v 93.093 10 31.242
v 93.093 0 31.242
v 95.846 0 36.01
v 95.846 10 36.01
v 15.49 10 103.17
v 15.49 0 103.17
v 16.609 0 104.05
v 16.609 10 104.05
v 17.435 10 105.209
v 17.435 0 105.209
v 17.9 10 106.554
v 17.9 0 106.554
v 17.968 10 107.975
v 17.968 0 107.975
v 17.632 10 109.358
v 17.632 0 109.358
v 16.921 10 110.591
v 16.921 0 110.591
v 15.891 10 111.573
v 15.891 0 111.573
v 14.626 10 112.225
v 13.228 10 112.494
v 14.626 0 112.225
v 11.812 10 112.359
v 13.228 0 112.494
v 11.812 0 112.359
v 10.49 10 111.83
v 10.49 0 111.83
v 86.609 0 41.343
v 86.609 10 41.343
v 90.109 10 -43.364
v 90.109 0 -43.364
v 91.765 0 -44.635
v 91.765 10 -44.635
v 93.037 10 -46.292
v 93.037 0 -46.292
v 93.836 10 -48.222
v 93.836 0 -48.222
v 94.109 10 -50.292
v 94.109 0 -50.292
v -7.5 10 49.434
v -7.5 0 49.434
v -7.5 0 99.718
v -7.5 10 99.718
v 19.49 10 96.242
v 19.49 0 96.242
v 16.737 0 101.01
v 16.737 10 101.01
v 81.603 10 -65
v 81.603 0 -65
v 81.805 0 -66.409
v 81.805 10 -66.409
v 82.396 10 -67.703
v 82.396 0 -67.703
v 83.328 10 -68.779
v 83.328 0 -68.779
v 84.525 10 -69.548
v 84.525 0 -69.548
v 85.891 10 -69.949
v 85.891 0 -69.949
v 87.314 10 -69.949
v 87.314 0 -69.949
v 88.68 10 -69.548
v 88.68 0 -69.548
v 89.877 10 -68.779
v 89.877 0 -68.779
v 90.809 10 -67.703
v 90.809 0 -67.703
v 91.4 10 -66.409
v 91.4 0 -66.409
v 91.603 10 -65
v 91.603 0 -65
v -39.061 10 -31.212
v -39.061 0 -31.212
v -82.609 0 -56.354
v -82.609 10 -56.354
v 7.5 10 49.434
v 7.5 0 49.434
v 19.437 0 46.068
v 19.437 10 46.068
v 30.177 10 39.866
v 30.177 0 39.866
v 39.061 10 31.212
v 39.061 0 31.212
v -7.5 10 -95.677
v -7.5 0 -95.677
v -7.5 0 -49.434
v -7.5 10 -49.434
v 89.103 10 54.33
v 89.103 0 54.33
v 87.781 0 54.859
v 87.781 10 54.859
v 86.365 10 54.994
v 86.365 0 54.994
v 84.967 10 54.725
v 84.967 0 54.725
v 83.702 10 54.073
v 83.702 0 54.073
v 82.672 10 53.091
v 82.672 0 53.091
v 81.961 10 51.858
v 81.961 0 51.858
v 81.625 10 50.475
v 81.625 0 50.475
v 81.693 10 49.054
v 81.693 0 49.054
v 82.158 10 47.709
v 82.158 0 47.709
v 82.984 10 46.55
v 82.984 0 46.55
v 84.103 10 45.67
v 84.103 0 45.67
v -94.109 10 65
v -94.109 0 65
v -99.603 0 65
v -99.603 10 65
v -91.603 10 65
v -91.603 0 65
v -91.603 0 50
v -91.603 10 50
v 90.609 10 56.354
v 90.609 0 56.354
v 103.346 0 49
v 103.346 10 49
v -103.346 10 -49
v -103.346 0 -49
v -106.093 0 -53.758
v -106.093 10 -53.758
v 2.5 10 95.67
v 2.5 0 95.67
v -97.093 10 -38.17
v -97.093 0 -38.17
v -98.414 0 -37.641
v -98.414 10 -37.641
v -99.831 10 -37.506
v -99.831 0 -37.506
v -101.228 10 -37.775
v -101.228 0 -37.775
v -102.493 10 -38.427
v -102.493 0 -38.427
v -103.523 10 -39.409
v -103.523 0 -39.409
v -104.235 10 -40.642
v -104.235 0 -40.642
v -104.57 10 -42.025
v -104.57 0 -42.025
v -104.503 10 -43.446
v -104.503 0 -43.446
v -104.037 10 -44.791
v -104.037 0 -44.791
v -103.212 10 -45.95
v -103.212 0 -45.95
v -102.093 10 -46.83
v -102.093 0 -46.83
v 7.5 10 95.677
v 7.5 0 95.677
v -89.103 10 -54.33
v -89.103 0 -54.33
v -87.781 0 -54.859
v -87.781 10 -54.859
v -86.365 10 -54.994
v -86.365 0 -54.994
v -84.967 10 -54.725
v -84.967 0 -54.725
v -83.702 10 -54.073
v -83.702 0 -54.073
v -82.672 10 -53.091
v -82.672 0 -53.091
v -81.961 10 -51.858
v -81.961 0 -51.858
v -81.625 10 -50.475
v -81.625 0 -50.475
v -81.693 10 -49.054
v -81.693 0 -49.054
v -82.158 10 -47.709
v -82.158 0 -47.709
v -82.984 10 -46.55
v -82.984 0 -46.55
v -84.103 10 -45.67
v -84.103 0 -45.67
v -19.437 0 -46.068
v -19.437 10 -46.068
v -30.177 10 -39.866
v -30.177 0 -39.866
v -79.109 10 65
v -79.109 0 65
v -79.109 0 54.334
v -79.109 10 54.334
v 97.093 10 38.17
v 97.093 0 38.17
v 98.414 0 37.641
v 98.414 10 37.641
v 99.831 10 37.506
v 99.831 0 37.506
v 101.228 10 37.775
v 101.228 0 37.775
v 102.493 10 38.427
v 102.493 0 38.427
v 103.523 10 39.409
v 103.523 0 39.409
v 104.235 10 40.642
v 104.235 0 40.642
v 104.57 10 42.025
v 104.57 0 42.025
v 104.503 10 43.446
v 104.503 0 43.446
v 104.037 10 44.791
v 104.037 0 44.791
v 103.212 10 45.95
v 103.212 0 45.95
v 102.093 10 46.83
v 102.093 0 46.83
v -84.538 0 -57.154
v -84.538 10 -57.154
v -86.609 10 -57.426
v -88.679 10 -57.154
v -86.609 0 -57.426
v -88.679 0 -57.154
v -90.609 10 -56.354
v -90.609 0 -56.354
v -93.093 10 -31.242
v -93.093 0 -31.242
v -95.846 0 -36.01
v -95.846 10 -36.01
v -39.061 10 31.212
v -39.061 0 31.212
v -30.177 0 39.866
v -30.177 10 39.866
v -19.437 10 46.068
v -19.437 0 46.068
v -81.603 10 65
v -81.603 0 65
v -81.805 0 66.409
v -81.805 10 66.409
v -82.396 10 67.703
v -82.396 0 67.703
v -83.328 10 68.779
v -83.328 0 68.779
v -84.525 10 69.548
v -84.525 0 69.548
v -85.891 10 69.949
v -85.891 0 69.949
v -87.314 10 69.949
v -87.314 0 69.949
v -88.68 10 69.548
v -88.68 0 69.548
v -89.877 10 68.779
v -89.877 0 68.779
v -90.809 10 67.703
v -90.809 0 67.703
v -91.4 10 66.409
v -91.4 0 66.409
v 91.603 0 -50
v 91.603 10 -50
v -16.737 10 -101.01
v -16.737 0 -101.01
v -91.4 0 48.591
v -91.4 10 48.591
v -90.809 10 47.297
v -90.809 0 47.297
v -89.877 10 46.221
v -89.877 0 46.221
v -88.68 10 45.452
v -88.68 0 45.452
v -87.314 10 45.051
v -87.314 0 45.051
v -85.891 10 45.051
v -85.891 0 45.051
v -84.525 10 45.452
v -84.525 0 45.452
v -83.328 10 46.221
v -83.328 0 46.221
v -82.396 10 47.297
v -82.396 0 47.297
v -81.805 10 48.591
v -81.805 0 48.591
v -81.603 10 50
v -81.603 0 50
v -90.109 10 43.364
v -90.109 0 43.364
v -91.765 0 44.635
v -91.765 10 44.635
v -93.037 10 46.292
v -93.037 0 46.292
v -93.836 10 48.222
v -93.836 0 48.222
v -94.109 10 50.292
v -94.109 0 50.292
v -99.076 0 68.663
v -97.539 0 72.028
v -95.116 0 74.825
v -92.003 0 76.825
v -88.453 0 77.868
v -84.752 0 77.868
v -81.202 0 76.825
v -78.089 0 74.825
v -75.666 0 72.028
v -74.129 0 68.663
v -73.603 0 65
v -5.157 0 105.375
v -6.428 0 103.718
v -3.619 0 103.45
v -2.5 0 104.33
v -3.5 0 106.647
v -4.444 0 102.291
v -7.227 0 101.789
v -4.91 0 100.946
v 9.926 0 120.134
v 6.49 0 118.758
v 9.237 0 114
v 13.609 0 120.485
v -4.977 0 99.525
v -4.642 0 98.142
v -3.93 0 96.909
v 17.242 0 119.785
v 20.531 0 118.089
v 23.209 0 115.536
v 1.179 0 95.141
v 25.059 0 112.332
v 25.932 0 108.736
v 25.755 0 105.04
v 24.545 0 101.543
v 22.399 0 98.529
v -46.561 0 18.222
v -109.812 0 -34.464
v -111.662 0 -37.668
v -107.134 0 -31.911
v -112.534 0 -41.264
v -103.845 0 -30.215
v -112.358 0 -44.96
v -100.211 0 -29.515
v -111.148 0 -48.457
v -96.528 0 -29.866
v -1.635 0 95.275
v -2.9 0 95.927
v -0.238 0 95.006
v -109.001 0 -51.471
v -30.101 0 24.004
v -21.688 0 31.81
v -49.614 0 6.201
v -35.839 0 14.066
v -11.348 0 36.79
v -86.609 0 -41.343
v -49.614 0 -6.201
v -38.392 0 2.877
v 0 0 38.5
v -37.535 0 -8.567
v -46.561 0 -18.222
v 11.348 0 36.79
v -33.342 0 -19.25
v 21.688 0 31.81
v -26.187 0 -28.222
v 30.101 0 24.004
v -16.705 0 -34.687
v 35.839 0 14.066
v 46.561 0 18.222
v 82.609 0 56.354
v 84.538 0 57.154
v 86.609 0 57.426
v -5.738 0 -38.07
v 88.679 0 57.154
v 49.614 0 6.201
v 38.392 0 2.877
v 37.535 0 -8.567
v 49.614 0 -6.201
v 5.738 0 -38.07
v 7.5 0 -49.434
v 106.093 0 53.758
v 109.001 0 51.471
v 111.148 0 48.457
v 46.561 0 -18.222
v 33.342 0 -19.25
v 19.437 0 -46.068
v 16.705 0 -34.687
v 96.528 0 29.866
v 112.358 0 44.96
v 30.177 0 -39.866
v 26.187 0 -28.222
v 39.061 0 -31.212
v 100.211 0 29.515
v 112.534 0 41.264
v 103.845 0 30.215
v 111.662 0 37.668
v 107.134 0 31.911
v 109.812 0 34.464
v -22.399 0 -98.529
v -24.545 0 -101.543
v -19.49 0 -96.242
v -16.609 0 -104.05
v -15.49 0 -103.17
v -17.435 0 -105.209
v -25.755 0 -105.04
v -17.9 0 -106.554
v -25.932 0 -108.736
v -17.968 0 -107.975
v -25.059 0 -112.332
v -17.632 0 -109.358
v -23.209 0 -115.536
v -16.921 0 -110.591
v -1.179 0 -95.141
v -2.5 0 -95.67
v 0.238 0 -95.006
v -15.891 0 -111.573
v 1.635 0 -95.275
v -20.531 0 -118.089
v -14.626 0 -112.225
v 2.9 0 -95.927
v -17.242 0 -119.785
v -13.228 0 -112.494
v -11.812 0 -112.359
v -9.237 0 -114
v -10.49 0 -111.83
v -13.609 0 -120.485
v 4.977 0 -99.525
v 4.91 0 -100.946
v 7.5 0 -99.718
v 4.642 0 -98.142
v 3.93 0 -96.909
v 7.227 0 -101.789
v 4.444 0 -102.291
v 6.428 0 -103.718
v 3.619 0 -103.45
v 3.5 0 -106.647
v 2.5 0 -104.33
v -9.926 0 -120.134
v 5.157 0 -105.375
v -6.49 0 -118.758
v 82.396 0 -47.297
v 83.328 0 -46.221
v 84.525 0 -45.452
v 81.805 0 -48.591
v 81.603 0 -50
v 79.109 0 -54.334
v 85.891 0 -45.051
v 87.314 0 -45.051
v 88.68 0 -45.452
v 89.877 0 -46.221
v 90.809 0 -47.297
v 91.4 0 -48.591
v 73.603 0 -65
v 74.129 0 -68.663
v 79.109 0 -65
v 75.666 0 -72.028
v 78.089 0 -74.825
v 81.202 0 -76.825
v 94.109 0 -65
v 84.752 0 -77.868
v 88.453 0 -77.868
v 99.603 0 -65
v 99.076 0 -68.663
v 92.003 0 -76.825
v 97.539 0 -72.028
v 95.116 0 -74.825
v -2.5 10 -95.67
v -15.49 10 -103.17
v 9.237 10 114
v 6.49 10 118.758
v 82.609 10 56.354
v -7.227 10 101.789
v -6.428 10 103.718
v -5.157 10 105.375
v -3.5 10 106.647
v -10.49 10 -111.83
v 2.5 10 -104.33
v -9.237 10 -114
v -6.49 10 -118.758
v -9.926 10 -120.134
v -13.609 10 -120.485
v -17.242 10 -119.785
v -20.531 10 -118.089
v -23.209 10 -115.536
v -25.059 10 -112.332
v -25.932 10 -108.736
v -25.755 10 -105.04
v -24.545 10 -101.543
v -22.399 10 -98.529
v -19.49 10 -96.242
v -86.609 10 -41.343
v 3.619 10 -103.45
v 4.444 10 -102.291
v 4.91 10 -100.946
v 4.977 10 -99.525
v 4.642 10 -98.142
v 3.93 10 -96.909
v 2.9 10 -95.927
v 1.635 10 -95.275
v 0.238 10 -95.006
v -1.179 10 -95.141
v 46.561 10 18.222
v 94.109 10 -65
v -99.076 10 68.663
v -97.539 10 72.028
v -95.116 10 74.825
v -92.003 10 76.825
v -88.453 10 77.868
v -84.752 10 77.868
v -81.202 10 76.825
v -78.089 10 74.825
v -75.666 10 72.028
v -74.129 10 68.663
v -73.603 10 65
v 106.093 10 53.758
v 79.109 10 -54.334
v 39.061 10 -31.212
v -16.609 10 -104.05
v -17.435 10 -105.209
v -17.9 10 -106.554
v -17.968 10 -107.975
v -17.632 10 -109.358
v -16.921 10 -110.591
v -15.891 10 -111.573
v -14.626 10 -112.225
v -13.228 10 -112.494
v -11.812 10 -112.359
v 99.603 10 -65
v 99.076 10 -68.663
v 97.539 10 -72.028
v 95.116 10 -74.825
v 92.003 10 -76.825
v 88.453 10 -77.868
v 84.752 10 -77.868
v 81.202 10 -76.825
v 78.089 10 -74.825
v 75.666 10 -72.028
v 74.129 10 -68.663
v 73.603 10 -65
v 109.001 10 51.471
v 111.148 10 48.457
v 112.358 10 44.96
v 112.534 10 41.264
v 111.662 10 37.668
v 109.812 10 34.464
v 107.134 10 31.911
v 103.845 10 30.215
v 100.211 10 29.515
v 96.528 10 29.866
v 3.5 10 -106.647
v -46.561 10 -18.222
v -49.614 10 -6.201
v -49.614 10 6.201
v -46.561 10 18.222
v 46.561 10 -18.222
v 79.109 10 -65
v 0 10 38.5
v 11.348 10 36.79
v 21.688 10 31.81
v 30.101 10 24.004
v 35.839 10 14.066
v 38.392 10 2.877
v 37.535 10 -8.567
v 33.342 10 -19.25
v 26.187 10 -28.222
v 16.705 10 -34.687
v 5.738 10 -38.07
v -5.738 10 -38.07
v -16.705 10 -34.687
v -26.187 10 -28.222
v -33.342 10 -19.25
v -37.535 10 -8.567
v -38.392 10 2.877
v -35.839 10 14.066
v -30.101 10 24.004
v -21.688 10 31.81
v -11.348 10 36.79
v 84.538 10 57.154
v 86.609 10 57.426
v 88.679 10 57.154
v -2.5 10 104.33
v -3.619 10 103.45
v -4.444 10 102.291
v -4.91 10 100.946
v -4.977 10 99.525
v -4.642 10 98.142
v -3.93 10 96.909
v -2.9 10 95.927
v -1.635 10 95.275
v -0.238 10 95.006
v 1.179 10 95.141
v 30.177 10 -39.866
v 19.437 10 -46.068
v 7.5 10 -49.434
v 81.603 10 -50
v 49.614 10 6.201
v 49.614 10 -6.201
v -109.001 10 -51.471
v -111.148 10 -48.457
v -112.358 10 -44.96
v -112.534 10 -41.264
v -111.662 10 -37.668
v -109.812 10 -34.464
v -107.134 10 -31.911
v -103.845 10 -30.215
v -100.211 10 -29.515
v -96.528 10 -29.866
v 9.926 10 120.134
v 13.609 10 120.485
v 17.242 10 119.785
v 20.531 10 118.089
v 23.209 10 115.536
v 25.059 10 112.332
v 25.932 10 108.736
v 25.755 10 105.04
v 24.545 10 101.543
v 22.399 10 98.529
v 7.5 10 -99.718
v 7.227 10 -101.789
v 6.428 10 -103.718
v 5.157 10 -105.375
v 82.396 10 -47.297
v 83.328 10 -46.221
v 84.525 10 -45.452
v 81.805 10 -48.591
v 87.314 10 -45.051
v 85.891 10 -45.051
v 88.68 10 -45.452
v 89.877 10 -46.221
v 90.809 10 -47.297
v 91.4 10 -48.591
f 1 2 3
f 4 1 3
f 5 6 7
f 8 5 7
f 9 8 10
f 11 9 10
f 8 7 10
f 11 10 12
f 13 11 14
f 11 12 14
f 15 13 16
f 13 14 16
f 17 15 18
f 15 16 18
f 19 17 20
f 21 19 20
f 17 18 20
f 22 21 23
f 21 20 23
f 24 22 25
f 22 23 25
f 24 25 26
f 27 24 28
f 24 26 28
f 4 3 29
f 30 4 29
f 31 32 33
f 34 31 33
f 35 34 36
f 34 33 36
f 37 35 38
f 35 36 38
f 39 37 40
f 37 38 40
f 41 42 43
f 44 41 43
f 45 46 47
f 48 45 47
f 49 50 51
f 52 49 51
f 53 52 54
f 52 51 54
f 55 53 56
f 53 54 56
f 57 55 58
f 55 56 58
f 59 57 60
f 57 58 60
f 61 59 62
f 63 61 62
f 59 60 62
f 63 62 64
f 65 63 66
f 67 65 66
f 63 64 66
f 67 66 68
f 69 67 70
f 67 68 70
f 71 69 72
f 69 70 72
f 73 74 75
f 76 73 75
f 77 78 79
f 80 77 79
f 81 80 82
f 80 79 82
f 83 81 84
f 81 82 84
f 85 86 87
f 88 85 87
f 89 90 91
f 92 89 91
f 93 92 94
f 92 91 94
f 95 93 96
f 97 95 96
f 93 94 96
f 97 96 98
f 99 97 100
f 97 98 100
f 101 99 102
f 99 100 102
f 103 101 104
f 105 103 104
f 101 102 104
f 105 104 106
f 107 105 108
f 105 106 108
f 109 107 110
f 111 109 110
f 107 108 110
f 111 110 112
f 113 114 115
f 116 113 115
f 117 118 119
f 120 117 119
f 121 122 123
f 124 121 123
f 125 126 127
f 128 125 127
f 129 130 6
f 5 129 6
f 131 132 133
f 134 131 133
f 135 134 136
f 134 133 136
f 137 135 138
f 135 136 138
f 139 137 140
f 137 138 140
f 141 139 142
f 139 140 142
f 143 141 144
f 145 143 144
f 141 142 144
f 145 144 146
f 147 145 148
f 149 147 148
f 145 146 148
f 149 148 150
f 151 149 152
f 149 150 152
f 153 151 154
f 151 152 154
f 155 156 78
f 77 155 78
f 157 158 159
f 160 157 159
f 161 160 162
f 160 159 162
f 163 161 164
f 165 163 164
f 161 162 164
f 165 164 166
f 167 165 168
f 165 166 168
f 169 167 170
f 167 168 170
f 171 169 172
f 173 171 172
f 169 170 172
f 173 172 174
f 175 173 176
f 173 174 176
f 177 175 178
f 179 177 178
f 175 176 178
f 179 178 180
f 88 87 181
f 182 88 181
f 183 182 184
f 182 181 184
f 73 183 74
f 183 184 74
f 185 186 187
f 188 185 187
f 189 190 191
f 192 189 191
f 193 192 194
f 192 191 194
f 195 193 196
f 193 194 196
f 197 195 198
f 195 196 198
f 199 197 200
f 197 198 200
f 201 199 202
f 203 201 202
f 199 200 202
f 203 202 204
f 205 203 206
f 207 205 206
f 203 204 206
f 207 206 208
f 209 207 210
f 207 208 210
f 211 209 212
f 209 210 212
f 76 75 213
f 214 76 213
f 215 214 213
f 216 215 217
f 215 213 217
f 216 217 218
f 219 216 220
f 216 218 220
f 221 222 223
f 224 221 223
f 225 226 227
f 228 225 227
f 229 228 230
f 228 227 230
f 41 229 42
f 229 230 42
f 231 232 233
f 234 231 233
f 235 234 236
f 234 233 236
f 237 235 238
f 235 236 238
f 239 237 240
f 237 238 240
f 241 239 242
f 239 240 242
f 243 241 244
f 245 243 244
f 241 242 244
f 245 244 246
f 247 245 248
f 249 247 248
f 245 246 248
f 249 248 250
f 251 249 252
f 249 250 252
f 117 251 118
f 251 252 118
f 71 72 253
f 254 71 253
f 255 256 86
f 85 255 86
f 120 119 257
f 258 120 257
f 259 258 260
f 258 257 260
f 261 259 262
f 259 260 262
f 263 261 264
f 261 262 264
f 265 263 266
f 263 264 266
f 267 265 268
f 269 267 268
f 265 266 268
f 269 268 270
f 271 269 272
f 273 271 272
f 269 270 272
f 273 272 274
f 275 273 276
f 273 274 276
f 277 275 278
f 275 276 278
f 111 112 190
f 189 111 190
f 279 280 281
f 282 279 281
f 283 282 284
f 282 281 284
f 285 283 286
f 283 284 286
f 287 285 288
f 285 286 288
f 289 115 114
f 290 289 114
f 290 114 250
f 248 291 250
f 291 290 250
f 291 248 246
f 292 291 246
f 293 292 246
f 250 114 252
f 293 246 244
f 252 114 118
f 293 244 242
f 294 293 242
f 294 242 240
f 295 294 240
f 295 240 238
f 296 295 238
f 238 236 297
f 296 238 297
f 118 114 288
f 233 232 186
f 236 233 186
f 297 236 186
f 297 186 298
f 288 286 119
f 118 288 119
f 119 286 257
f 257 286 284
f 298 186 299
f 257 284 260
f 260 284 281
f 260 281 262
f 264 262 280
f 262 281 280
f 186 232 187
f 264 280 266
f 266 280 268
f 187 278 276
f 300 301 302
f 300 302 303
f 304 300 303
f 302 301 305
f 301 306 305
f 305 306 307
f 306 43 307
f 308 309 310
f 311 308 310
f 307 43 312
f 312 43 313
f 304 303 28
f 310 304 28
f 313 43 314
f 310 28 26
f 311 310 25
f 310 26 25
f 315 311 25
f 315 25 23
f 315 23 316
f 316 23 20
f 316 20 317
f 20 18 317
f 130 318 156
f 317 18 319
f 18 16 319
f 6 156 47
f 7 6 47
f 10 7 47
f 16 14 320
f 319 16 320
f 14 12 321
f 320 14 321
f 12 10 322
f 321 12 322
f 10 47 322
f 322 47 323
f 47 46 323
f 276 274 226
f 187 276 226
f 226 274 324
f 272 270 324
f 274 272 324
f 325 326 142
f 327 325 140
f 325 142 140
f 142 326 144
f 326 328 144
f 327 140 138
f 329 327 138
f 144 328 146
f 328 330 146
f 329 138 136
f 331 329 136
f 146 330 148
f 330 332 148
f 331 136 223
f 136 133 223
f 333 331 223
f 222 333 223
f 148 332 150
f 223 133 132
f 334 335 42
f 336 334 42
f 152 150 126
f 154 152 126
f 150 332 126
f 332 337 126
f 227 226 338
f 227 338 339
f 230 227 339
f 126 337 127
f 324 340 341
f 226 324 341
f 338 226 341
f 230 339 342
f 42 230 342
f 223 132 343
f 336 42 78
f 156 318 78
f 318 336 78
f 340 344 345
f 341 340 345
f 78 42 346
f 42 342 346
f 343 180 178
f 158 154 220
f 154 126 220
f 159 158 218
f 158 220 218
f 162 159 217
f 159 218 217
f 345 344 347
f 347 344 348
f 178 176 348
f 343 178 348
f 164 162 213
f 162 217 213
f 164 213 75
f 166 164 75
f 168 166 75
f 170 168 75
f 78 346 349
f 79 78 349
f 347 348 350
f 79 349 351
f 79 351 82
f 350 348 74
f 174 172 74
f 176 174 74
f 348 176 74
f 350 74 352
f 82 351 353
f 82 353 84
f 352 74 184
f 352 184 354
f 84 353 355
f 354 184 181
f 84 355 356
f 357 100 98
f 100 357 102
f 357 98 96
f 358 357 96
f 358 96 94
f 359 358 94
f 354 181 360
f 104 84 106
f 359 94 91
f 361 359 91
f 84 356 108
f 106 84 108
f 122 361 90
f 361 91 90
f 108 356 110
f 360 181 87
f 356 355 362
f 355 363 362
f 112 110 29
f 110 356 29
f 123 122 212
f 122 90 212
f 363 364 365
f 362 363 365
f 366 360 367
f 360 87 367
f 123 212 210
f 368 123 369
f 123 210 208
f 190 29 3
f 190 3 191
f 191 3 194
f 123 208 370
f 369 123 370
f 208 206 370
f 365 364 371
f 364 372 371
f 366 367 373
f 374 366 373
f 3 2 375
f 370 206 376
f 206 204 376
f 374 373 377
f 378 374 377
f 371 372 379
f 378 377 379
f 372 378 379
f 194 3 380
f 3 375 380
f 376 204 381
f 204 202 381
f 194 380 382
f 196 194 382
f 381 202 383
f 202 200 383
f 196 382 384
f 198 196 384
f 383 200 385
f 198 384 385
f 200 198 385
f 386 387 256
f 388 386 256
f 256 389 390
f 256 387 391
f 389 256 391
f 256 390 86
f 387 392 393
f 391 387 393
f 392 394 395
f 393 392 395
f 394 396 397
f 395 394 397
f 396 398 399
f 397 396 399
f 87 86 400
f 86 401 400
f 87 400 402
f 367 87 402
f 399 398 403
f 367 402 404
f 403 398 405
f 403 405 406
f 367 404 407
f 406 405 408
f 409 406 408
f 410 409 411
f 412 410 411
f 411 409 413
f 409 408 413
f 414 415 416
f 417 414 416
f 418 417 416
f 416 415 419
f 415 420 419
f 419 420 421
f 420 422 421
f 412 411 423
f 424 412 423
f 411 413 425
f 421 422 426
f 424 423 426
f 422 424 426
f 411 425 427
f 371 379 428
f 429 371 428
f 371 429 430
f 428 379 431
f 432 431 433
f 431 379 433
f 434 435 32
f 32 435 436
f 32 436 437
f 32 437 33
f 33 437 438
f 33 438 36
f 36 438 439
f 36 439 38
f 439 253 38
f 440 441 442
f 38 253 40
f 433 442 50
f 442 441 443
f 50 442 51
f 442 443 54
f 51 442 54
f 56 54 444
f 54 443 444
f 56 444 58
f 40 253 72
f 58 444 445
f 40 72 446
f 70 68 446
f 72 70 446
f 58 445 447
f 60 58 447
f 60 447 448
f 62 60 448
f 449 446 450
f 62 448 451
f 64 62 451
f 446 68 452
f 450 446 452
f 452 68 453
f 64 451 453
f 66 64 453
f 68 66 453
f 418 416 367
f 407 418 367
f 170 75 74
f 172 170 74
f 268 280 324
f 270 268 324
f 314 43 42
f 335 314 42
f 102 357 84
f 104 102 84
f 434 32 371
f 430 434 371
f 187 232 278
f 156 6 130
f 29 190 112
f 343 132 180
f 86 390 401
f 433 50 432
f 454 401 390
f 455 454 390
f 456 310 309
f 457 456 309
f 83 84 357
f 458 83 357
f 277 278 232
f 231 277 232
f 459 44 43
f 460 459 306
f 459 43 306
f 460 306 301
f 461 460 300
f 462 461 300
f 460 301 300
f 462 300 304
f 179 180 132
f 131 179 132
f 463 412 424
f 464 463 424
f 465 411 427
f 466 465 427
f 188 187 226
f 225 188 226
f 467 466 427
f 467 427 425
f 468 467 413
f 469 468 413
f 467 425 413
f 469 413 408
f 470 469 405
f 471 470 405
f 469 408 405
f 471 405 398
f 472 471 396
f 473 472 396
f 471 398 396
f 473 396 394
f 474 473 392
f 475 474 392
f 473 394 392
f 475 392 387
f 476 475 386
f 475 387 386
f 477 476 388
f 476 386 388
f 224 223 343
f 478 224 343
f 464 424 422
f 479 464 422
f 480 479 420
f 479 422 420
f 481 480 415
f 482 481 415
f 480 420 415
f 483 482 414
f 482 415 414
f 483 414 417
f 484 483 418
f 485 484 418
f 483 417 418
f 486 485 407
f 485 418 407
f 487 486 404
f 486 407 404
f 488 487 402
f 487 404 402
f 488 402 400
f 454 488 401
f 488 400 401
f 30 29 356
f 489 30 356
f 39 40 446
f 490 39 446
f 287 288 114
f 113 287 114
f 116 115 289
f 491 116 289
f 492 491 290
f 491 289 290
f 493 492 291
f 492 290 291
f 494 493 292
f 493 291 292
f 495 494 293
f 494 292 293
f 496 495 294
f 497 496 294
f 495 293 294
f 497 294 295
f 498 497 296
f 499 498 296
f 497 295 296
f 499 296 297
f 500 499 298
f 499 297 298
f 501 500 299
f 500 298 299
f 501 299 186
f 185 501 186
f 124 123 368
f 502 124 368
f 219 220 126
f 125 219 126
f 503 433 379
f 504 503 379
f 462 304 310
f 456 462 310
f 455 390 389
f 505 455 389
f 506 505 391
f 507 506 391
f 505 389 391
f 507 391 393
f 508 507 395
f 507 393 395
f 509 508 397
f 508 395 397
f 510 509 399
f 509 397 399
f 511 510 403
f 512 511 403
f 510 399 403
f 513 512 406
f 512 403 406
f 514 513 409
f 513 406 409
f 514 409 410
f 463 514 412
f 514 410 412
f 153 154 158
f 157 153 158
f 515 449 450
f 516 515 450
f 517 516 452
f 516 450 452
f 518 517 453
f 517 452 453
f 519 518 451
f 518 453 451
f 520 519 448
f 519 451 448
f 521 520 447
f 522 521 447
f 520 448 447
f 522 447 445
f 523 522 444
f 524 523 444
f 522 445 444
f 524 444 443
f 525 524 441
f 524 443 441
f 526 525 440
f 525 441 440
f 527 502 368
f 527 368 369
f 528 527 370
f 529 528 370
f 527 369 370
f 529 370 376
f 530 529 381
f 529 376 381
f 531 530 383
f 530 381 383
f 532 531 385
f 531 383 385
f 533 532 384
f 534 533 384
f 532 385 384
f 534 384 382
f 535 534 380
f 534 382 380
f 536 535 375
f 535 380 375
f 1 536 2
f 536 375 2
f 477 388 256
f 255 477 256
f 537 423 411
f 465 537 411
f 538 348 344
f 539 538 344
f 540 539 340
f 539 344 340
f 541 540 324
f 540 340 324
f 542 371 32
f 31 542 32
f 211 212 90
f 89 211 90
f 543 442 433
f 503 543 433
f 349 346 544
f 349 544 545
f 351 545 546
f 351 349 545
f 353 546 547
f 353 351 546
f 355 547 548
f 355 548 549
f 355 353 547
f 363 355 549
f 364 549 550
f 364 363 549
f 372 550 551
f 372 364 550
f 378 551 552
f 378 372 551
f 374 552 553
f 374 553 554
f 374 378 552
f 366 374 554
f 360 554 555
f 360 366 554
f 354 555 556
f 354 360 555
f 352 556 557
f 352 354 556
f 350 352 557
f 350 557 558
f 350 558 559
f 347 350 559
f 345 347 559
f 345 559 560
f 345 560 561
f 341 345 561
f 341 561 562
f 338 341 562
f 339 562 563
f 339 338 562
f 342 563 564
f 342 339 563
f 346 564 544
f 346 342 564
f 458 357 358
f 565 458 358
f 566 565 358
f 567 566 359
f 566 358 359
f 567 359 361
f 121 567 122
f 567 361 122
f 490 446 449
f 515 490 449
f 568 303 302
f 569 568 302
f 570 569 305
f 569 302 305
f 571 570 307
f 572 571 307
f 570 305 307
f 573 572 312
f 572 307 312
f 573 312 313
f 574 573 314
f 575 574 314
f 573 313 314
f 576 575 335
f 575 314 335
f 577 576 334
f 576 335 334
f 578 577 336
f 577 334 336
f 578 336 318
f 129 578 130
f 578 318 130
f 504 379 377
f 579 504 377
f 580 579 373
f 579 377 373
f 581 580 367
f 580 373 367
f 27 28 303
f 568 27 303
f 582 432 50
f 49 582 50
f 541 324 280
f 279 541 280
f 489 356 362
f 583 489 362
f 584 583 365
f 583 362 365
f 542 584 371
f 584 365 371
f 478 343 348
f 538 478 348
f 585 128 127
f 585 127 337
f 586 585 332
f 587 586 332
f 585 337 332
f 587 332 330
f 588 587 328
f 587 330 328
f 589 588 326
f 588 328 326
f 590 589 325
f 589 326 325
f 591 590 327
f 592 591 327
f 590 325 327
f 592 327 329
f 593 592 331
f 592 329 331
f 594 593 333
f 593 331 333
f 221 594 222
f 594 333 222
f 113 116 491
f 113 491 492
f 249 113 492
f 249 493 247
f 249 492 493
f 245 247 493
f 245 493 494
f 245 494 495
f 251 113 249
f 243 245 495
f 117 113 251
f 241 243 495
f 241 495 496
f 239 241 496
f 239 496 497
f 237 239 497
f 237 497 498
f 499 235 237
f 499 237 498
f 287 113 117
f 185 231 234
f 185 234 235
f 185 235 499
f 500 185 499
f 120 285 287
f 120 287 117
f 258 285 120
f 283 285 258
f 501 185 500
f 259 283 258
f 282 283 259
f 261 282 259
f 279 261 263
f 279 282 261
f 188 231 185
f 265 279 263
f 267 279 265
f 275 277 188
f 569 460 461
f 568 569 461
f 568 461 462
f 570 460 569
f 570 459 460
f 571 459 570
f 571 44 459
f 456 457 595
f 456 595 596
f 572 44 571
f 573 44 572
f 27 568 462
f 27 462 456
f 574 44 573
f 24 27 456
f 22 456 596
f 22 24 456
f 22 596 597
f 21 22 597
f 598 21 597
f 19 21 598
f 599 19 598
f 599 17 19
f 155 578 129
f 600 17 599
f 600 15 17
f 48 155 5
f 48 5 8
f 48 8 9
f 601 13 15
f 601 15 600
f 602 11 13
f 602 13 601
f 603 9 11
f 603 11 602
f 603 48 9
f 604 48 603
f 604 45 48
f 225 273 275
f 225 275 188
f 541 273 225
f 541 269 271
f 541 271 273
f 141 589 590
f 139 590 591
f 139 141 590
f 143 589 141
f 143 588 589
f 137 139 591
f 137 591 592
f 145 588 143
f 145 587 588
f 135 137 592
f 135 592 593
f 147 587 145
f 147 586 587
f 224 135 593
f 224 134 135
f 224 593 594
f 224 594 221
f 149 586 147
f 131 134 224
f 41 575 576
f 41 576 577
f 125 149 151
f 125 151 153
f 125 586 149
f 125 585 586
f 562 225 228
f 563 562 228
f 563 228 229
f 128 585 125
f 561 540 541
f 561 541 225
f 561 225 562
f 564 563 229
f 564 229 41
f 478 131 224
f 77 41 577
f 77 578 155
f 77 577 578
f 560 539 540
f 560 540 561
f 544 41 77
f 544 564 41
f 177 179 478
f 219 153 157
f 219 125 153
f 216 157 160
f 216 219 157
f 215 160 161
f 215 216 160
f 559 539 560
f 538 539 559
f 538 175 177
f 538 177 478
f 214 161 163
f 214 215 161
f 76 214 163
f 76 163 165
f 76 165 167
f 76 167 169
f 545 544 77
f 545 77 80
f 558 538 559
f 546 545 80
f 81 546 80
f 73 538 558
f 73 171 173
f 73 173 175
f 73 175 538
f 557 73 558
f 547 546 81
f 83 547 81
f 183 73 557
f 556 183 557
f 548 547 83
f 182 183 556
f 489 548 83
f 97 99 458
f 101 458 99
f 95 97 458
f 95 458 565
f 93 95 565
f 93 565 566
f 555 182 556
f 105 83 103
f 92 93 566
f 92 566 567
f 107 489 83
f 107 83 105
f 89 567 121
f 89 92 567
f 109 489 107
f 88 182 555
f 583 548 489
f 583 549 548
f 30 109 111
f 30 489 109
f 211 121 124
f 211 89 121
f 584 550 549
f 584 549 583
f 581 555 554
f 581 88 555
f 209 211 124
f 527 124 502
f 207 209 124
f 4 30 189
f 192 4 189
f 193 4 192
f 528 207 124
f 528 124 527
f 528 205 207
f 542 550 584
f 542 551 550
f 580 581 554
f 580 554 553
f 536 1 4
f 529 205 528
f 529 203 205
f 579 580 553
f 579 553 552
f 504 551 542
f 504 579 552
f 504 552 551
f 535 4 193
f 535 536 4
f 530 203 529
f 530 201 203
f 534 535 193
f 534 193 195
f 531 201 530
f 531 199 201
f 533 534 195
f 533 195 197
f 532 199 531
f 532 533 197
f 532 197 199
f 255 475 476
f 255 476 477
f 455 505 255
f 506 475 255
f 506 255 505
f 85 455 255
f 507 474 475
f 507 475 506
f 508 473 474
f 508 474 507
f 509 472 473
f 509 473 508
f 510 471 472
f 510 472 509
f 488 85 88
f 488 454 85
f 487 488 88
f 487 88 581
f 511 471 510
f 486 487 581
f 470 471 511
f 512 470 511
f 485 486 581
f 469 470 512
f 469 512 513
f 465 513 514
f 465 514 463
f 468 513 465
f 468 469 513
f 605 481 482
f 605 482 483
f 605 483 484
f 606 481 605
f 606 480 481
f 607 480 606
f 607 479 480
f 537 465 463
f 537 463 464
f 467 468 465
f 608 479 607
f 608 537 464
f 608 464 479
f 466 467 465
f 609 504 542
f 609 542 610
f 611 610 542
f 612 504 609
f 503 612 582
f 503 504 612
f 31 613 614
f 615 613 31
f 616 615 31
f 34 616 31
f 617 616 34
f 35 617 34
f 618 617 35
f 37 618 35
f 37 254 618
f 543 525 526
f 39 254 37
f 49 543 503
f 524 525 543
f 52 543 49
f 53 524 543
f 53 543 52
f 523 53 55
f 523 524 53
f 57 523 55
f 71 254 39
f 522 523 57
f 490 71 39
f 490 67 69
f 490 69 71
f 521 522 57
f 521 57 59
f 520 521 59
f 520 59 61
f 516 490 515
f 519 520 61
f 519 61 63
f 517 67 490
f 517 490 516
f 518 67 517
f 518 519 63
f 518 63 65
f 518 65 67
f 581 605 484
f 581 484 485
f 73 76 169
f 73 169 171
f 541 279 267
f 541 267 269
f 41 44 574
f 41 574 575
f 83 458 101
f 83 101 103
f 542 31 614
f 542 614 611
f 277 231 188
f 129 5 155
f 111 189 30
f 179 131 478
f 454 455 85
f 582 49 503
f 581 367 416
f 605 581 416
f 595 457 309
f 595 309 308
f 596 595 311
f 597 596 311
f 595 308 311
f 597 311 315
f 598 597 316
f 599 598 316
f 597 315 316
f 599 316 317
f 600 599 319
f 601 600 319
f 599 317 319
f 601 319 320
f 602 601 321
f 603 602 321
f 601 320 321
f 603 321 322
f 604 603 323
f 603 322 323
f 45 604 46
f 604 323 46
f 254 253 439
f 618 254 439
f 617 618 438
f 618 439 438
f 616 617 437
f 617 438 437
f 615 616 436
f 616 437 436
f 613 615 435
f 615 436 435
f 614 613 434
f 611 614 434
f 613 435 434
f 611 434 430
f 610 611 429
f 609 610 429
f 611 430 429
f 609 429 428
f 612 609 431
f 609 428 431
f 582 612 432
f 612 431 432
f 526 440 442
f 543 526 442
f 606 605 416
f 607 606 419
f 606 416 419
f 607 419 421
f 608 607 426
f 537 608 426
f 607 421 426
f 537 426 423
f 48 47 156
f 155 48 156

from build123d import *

# Parameters (mm, degrees)
SKETCH1_R           = 38.5
BOSS_EXTRUDE1_DEPTH = 10


with BuildPart() as part:
    # Sketch1 → Boss-Extrude1 (new body)
    with BuildSketch(Plane(origin=(0, 0, 0), x_dir=(1, 0, 0), z_dir=(0, 1, 0))):
        with BuildLine():
            Line((7.5, 49.434299833), (7.5, 99.718353376))
            ThreePointArc((7.5, 99.718353376), (6.42820323, 103.718353376), (3.5, 106.646556606))
            Line((3.5, 106.646556606), (-9.237337622, 114.000461911))
            Line((-9.237337622, 114.000461911), (-6.490381057, 118.758330249))
            ThreePointArc((-6.490381057, 118.758330249), (-24.248711306, 114), (-19.490381057, 96.241669751))
            Line((-19.490381057, 96.241669751), (-16.737337622, 101.010080854))
            Line((-16.737337622, 101.010080854), (-7.5, 95.676901492))
            Line((-7.5, 95.676901492), (-7.5, 49.434299833))
            ThreePointArc((-7.5, 49.434299833), (-25, 43.301270189), (-39.061359474, 31.212340445))
            Line((-39.061359474, 31.212340445), (-82.608627247, 56.354367216))
            ThreePointArc((-82.608627247, 56.354367216), (-86.608627247, 57.426163986), (-90.608627247, 56.354367216))
            Line((-90.608627247, 56.354367216), (-103.34596487, 49.000461911))
            Line((-103.34596487, 49.000461911), (-106.092921435, 53.758330249))
            ThreePointArc((-106.092921435, 53.758330249), (-110.851251684, 36), (-93.092921435, 31.241669751))
            Line((-93.092921435, 31.241669751), (-95.84596487, 36.010080854))
            Line((-95.84596487, 36.010080854), (-86.608627247, 41.343260217))
            Line((-86.608627247, 41.343260217), (-46.561359474, 18.221959388))
            ThreePointArc((-46.561359474, 18.221959388), (-50, 0), (-46.561359474, -18.221959388))
            Line((-46.561359474, -18.221959388), (-90.108627247, -43.36398616))
            ThreePointArc((-90.108627247, -43.36398616), (-93.036830477, -46.29218939), (-94.108627247, -50.29218939))
            Line((-94.108627247, -50.29218939), (-94.108627247, -65))
            Line((-94.108627247, -65), (-99.602540378, -65))
            ThreePointArc((-99.602540378, -65), (-86.602540378, -78), (-73.602540378, -65))
            Line((-73.602540378, -65), (-79.108627247, -65))
            Line((-79.108627247, -65), (-79.108627247, -54.333641274))
            Line((-79.108627247, -54.333641274), (-39.061359474, -31.212340445))
            ThreePointArc((-39.061359474, -31.212340445), (-25, -43.301270189), (-7.5, -49.434299833))
            Line((-7.5, -49.434299833), (-7.5, -99.718353376))
            ThreePointArc((-7.5, -99.718353376), (-6.42820323, -103.718353376), (-3.5, -106.646556606))
            Line((-3.5, -106.646556606), (9.237337622, -114.000461911))
            Line((9.237337622, -114.000461911), (6.490381057, -118.758330249))
            ThreePointArc((6.490381057, -118.758330249), (24.248711306, -114), (19.490381057, -96.241669751))
            Line((19.490381057, -96.241669751), (16.737337622, -101.010080854))
            Line((16.737337622, -101.010080854), (7.5, -95.676901492))
            Line((7.5, -95.676901492), (7.5, -49.434299833))
            ThreePointArc((7.5, -49.434299833), (25, -43.301270189), (39.061359474, -31.212340445))
            Line((39.061359474, -31.212340445), (82.608627247, -56.354367216))
            ThreePointArc((82.608627247, -56.354367216), (86.608627247, -57.426163986), (90.608627247, -56.354367216))
            Line((90.608627247, -56.354367216), (103.34596487, -49.000461911))
            Line((103.34596487, -49.000461911), (106.092921435, -53.758330249))
            ThreePointArc((106.092921435, -53.758330249), (110.851251684, -36), (93.092921435, -31.241669751))
            Line((93.092921435, -31.241669751), (95.84596487, -36.010080854))
            Line((95.84596487, -36.010080854), (86.608627247, -41.343260217))
            Line((86.608627247, -41.343260217), (46.561359474, -18.221959388))
            ThreePointArc((46.561359474, -18.221959388), (50, 0), (46.561359474, 18.221959388))
            Line((46.561359474, 18.221959388), (90.108627247, 43.36398616))
            ThreePointArc((90.108627247, 43.36398616), (93.036830477, 46.29218939), (94.108627247, 50.29218939))
            Line((94.108627247, 50.29218939), (94.108627247, 65))
            Line((94.108627247, 65), (99.602540378, 65))
            ThreePointArc((99.602540378, 65), (86.602540378, 78), (73.602540378, 65))
            Line((73.602540378, 65), (79.108627247, 65))
            Line((79.108627247, 65), (79.108627247, 54.333641274))
            Line((79.108627247, 54.333641274), (39.061359474, 31.212340445))
            ThreePointArc((39.061359474, 31.212340445), (25, 43.301270189), (7.5, 49.434299833))
        make_face()
        with Locations(Location((0, 0, 0), (0, 0, 270))):
            Circle(SKETCH1_R, mode=Mode.SUBTRACT)
        with BuildLine():
            Line((-10.490381057, 111.830127019), (2.5, 104.330127019))
            ThreePointArc((2.5, 104.330127019), (4.330127019, 97.5), (-2.5, 95.669872981))
            Line((-2.5, 95.669872981), (-15.490381057, 103.169872981))
            ThreePointArc((-15.490381057, 103.169872981), (-17.320508076, 110), (-10.490381057, 111.830127019))
        make_face(mode=Mode.SUBTRACT)
        with BuildLine():
            Line((91.602540378, 65), (91.602540378, 50))
            ThreePointArc((91.602540378, 50), (86.602540378, 45), (81.602540378, 50))
            Line((81.602540378, 50), (81.602540378, 65))
            ThreePointArc((81.602540378, 65), (86.602540378, 70), (91.602540378, 65))
        make_face(mode=Mode.SUBTRACT)
        with BuildLine():
            Line((102.092921435, -46.830127019), (89.102540378, -54.330127019))
            ThreePointArc((89.102540378, -54.330127019), (82.27241336, -52.5), (84.102540378, -45.669872981))
            Line((84.102540378, -45.669872981), (97.092921435, -38.169872981))
            ThreePointArc((97.092921435, -38.169872981), (103.923048454, -40), (102.092921435, -46.830127019))
        make_face(mode=Mode.SUBTRACT)
        with BuildLine():
            Line((10.490381057, -111.830127019), (-2.5, -104.330127019))
            ThreePointArc((-2.5, -104.330127019), (-4.330127019, -97.5), (2.5, -95.669872981))
            Line((2.5, -95.669872981), (15.490381057, -103.169872981))
            ThreePointArc((15.490381057, -103.169872981), (17.320508076, -110), (10.490381057, -111.830127019))
        make_face(mode=Mode.SUBTRACT)
        with BuildLine():
            Line((-91.602540378, -65), (-91.602540378, -50))
            ThreePointArc((-91.602540378, -50), (-86.602540378, -45), (-81.602540378, -50))
            Line((-81.602540378, -50), (-81.602540378, -65))
            ThreePointArc((-81.602540378, -65), (-86.602540378, -70), (-91.602540378, -65))
        make_face(mode=Mode.SUBTRACT)
        with BuildLine():
            Line((-102.092921435, 46.830127019), (-89.102540378, 54.330127019))
            ThreePointArc((-89.102540378, 54.330127019), (-82.27241336, 52.5), (-84.102540378, 45.669872981))
            Line((-84.102540378, 45.669872981), (-97.092921435, 38.169872981))
            ThreePointArc((-97.092921435, 38.169872981), (-103.923048454, 40), (-102.092921435, 46.830127019))
        make_face(mode=Mode.SUBTRACT)
    extrude(amount=BOSS_EXTRUDE1_DEPTH)


solid = part.part
